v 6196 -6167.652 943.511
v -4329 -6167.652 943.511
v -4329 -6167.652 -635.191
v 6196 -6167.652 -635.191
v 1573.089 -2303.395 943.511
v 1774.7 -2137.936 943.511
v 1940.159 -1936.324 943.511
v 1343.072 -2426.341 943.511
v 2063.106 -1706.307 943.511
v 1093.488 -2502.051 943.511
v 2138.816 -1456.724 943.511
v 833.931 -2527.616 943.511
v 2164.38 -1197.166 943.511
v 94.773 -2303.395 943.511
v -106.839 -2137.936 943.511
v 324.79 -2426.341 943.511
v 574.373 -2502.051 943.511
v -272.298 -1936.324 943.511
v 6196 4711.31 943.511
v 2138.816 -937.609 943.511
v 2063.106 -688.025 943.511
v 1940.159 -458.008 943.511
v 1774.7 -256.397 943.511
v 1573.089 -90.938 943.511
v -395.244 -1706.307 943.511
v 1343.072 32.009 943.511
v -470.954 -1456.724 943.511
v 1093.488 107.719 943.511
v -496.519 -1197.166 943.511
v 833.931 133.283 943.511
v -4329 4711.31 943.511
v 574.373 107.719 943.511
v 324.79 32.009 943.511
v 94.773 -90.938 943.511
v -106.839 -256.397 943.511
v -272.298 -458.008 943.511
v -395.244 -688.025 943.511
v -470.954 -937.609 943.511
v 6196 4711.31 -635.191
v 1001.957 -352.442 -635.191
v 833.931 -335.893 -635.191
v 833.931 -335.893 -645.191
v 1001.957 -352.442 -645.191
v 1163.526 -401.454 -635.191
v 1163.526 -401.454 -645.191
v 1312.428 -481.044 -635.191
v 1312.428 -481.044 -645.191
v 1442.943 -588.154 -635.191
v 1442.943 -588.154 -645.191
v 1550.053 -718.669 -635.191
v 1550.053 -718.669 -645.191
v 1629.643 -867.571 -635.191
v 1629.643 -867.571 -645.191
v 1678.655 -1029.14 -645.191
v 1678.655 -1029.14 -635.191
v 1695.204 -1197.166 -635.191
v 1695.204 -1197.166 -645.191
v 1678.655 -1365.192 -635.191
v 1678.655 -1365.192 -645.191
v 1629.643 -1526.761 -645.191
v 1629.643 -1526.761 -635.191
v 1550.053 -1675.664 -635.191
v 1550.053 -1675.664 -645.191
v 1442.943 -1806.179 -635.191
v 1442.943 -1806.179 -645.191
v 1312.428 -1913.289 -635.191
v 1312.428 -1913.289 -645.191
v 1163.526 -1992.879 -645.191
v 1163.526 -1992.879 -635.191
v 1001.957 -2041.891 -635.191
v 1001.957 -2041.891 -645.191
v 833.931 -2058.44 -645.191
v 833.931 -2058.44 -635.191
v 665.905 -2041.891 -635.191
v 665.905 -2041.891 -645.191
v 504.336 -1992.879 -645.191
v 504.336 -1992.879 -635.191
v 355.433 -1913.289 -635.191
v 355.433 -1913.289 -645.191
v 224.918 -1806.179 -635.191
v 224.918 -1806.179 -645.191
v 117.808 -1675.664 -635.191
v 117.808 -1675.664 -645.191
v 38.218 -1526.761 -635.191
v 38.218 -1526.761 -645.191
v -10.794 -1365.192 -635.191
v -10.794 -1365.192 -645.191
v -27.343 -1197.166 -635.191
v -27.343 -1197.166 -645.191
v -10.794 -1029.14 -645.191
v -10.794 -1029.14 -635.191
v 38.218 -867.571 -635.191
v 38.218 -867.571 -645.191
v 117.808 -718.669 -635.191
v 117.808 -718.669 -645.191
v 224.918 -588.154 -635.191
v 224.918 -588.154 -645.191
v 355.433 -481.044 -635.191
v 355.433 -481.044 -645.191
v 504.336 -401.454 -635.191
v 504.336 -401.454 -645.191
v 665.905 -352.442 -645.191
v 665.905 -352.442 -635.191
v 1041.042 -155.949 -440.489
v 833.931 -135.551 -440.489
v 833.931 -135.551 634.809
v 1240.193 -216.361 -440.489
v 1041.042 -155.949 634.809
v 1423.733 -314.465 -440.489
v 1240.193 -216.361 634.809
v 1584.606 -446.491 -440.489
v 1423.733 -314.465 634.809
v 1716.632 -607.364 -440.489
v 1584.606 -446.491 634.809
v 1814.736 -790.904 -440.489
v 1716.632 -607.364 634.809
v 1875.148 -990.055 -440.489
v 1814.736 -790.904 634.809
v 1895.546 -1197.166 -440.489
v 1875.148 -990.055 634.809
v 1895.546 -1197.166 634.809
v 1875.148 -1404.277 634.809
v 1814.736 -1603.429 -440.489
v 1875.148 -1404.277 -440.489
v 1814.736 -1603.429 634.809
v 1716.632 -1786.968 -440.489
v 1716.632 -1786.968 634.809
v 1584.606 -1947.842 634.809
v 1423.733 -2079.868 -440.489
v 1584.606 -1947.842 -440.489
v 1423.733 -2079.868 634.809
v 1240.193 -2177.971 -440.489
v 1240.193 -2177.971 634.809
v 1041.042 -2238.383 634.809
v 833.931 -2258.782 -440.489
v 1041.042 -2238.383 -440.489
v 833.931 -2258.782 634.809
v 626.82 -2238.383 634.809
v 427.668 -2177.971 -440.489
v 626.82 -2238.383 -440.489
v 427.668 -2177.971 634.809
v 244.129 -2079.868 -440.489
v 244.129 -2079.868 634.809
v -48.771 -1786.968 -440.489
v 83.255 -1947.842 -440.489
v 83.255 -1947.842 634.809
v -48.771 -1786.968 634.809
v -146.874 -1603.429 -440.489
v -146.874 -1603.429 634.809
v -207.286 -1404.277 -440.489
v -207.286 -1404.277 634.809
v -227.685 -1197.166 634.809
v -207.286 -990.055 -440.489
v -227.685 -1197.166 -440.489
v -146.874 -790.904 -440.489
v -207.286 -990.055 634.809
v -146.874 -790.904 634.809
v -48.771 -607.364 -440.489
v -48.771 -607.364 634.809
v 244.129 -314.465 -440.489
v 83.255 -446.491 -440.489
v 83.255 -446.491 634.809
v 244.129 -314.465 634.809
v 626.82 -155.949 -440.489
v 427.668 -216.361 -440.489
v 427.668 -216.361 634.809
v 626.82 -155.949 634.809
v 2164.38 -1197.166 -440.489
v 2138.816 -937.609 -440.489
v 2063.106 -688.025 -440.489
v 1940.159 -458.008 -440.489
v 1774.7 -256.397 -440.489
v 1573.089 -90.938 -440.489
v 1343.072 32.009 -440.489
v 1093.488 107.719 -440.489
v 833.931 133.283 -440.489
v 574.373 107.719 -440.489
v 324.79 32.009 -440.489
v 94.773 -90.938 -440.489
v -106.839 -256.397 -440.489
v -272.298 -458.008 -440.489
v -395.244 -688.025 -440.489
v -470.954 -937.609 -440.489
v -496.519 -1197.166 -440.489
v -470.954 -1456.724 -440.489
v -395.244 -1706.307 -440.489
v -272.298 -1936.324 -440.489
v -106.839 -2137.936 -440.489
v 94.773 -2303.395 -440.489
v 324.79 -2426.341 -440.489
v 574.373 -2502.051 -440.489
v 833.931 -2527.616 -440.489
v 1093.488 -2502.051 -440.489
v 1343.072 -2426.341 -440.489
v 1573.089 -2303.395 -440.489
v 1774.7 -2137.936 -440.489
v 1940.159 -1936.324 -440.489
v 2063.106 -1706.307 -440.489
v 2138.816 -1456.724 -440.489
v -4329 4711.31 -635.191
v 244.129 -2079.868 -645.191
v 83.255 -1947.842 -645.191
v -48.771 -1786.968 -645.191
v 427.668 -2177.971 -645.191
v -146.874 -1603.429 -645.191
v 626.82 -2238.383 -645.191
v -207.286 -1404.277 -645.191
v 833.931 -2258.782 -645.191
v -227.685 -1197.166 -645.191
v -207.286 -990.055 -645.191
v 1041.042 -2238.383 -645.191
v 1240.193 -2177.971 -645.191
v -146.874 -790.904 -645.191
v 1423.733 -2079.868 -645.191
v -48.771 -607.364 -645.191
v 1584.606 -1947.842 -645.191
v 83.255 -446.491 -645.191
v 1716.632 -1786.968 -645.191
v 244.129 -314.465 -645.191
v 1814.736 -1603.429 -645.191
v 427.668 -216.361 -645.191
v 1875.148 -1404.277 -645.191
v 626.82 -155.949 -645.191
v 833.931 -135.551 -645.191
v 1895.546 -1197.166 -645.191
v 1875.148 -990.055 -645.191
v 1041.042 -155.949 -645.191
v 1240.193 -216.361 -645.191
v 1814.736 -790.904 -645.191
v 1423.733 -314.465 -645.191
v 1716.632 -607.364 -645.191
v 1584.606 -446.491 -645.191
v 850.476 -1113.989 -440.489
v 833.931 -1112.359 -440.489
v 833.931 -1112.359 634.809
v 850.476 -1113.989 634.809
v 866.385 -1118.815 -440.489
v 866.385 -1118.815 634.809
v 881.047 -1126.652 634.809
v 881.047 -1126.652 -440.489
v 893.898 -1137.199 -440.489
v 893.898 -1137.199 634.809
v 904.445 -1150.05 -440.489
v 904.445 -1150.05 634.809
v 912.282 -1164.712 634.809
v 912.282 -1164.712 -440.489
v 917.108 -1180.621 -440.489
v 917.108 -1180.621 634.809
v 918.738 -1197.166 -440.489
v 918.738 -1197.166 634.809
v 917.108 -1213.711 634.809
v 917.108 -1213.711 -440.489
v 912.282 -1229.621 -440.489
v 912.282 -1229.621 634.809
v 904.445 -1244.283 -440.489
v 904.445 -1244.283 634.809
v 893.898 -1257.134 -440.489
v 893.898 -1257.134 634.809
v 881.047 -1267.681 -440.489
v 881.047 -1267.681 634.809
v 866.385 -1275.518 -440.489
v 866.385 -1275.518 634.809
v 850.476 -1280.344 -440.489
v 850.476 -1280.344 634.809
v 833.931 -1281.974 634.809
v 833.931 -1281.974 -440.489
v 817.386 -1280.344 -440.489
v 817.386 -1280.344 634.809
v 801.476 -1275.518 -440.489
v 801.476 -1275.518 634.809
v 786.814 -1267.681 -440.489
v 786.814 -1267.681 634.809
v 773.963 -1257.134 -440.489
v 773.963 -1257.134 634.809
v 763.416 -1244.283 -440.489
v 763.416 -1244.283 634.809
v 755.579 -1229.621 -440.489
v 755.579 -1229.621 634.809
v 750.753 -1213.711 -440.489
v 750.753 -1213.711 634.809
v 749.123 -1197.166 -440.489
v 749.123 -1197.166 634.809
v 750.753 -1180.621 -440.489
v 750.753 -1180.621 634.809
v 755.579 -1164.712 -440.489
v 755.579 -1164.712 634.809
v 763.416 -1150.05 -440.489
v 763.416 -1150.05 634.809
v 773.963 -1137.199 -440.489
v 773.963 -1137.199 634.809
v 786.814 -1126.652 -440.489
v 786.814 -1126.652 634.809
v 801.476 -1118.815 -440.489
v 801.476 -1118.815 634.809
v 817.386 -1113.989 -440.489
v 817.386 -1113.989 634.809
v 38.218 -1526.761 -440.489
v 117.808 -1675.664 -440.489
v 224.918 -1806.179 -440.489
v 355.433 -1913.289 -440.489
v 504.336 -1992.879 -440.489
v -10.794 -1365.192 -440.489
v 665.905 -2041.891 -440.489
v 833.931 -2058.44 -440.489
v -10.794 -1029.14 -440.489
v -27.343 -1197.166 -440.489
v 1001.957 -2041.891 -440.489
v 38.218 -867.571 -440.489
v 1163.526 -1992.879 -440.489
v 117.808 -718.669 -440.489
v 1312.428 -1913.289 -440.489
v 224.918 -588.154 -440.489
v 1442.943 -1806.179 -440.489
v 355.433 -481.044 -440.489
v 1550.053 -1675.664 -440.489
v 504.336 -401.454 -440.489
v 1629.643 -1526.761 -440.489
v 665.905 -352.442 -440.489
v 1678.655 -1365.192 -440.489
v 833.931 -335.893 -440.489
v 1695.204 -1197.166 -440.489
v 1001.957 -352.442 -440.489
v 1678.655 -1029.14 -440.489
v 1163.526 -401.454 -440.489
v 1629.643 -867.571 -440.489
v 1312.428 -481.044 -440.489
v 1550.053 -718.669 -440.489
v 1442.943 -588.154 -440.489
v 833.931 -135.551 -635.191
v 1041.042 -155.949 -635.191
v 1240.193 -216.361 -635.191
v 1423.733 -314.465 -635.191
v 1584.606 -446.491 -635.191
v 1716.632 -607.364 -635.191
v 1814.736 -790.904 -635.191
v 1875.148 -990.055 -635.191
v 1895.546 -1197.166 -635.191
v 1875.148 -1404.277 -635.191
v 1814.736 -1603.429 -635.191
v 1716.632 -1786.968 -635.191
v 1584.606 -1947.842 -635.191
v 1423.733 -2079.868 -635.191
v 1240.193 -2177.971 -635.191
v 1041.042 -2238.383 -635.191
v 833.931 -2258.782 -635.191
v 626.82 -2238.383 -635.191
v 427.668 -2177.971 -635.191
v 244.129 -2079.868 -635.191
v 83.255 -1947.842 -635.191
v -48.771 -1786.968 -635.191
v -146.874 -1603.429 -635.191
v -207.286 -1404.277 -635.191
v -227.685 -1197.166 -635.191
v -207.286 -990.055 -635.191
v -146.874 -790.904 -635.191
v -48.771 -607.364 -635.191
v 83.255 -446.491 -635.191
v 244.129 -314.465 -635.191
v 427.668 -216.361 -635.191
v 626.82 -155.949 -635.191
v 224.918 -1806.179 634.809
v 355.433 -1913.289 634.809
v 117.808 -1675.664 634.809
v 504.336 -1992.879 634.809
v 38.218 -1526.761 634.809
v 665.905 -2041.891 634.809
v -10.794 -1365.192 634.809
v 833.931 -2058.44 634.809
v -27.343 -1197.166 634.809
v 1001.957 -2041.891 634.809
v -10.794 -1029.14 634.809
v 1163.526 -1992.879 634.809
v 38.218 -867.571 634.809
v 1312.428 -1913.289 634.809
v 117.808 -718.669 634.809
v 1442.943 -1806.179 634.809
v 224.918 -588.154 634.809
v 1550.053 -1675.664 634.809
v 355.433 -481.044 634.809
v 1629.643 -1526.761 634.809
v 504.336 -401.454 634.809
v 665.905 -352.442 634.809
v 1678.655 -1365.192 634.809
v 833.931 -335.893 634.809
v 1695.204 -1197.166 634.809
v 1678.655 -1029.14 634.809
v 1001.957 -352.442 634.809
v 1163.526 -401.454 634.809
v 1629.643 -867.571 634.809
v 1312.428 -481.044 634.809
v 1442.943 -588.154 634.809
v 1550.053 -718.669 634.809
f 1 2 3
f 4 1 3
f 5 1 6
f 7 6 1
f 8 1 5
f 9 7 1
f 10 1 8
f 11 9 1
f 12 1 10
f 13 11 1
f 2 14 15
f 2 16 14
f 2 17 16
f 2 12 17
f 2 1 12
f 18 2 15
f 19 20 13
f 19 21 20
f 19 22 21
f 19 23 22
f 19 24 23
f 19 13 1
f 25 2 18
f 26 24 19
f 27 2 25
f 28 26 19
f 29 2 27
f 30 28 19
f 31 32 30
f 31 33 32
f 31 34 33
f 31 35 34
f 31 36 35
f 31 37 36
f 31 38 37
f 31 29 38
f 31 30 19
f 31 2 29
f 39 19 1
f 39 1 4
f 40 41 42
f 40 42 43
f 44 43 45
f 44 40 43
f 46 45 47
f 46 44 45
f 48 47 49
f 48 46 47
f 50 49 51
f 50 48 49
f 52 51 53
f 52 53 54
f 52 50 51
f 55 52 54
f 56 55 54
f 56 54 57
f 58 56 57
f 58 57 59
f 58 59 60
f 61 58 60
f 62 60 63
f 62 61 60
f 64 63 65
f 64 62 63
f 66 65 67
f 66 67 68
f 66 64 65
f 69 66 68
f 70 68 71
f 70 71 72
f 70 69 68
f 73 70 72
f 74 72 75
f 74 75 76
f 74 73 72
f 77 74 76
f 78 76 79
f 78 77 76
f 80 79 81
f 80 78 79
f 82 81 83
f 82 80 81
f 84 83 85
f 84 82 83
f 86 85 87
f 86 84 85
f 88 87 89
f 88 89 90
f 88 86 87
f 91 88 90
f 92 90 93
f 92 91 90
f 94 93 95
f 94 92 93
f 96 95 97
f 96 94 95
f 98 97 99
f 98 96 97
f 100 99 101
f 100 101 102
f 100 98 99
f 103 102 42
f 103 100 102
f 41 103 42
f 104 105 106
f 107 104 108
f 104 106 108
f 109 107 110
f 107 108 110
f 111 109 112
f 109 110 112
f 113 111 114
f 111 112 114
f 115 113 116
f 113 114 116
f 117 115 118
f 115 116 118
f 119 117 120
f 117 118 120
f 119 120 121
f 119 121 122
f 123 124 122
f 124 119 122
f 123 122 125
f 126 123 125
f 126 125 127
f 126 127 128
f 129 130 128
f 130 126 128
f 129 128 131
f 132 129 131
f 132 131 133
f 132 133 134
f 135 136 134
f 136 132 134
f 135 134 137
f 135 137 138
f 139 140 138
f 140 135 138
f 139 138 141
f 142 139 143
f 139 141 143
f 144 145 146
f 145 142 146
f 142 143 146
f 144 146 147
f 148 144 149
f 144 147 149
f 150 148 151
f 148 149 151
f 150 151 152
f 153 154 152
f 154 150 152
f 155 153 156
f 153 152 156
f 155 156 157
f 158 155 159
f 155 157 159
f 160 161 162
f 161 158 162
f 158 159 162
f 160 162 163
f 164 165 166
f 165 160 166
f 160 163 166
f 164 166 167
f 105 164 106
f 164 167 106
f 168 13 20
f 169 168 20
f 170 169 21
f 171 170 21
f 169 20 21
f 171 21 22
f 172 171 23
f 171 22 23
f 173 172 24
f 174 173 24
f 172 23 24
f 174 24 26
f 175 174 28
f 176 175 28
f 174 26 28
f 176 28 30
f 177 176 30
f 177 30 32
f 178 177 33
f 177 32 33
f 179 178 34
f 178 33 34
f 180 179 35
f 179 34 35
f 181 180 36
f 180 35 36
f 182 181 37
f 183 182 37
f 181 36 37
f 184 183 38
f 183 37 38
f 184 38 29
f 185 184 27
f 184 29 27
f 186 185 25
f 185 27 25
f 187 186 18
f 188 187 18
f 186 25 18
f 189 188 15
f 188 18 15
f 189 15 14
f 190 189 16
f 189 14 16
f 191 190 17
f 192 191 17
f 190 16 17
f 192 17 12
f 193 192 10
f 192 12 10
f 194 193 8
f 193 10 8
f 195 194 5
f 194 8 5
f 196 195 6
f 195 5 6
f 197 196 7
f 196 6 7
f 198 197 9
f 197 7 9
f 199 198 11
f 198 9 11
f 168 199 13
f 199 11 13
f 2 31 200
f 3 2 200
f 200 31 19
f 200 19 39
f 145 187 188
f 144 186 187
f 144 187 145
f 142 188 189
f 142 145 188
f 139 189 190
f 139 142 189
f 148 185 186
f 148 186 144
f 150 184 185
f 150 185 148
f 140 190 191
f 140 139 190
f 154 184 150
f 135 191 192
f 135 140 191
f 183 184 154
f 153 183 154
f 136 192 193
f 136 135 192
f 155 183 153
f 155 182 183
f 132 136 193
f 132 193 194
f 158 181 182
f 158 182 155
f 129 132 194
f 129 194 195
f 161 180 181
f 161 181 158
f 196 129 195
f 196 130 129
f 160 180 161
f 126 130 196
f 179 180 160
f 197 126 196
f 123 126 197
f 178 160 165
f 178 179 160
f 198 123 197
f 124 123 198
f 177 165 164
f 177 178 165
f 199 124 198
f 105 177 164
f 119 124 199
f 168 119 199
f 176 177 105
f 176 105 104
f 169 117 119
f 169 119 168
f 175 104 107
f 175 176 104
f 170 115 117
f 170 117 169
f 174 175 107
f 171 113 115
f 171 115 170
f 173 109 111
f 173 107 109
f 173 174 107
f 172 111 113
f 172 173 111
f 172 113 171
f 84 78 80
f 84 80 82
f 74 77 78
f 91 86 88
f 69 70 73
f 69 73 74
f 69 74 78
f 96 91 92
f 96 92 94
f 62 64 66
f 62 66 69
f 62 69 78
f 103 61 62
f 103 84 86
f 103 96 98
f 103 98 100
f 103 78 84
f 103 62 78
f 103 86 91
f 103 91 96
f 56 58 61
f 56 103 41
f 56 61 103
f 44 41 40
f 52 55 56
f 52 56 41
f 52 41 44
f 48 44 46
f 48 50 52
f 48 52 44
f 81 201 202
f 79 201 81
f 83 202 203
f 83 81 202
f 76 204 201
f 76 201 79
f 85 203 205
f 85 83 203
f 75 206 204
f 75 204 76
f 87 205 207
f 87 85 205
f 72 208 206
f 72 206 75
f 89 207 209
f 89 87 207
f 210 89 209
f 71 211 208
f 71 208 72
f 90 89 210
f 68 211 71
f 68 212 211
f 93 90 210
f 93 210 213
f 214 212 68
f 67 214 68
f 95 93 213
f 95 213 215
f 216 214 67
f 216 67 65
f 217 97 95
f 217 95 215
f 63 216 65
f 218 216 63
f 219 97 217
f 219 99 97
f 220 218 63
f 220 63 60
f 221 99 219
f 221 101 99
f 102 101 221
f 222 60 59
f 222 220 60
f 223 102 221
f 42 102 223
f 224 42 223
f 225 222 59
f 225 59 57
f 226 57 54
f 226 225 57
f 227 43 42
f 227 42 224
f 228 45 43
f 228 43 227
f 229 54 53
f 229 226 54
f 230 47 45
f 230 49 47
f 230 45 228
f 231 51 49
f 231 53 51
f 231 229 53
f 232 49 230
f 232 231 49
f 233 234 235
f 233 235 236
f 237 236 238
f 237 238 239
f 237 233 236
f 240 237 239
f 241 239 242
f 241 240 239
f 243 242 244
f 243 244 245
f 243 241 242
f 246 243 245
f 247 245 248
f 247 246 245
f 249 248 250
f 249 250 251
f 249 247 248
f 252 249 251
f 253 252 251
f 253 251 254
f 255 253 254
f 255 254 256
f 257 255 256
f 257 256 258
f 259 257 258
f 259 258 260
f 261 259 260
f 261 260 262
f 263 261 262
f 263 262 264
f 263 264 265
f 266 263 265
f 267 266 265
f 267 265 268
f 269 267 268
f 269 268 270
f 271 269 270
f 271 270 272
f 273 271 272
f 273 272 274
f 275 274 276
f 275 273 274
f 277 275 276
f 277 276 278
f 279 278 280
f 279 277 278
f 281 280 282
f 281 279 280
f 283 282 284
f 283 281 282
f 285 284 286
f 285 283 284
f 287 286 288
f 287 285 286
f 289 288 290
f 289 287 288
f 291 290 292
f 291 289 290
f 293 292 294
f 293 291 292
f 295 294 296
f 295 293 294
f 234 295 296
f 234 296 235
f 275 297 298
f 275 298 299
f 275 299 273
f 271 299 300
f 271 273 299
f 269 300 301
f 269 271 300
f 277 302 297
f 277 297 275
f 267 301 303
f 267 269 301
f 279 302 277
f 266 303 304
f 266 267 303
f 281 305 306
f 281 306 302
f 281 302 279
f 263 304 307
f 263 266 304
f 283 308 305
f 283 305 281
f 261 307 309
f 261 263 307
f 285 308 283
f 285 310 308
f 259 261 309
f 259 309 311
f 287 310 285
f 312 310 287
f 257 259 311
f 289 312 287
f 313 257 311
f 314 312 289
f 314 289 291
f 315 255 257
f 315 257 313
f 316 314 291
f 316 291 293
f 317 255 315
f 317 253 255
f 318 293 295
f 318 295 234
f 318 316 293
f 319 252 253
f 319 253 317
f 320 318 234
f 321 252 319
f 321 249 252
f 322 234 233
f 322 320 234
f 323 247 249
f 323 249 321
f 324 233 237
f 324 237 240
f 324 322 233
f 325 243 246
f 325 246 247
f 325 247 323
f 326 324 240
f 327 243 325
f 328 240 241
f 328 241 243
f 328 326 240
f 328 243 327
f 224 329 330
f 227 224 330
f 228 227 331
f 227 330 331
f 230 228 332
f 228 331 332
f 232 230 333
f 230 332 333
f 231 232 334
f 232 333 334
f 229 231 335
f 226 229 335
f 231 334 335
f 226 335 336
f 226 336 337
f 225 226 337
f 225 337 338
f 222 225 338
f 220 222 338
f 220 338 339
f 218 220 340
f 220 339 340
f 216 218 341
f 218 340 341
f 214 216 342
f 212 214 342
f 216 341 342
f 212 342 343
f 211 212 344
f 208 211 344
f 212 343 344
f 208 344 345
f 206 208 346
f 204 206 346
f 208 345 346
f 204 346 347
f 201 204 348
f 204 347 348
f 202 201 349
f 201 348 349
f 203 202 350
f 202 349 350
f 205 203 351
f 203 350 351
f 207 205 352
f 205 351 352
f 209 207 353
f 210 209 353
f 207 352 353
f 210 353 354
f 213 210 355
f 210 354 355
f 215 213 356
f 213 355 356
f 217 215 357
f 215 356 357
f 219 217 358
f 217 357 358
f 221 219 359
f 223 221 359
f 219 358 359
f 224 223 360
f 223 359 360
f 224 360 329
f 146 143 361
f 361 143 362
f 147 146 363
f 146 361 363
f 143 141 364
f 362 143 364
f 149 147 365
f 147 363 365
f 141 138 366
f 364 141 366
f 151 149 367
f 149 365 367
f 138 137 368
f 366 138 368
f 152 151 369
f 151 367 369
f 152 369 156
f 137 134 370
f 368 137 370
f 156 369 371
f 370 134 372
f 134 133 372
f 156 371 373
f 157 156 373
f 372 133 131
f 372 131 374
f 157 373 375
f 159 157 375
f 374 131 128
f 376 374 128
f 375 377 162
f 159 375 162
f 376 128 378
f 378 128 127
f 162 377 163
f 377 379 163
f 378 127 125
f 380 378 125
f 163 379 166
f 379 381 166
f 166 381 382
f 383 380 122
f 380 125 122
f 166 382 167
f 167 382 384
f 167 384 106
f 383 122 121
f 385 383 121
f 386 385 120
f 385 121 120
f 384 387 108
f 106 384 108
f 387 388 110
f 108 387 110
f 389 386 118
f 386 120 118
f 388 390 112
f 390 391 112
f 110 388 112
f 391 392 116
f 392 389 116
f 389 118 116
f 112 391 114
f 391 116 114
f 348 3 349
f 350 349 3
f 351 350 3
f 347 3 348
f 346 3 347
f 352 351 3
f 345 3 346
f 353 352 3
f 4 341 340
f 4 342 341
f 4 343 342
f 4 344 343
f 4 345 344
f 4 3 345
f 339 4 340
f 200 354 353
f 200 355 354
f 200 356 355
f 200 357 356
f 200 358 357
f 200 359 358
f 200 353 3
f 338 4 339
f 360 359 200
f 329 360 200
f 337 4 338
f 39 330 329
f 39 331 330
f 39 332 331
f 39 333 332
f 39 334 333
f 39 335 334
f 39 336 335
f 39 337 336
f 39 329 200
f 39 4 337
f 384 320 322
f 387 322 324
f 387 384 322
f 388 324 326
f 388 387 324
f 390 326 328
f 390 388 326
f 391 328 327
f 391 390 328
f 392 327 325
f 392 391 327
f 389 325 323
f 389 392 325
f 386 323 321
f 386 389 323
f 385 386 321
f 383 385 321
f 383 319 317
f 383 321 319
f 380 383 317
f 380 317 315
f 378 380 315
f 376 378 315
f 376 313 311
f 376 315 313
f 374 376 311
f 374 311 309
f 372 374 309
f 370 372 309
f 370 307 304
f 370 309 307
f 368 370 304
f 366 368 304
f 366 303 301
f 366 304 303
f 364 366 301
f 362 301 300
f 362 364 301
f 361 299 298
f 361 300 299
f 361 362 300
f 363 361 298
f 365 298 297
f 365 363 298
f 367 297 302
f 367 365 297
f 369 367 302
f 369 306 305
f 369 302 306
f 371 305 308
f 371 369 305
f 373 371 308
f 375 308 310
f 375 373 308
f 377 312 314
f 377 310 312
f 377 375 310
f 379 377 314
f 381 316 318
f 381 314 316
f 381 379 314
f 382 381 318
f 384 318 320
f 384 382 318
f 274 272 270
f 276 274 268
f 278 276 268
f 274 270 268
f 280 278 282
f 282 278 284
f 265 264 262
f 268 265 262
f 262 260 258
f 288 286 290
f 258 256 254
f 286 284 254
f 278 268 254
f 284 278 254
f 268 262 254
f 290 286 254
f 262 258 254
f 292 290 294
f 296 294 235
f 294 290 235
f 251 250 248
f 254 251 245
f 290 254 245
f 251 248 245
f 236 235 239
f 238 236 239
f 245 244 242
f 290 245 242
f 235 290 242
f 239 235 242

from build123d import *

# Parameters (mm, degrees)
BOSS_EXTRUDE1_DEPTH      = 6196
BOSS_EXTRUDE1_DEPTH_BACK = 4329
SKETCH1_W                = 1578.701976668
SKETCH1_H                = 10878.961606317
SKETCH3_R                = 1330.449328347
CUT_EXTRUDE1_DEPTH       = 1384
SKETCH4_R                = 84.807211279
BOSS_EXTRUDE2_DEPTH      = 1270
SKETCH5_R                = 1061.615772672
SKETCH5_R_2              = 861.273399979
BOSS_EXTRUDE3_DEPTH      = 10
BOSS_EXTRUDE4_START      = -1270
SKETCH5_2_R              = 1061.615772672
SKETCH5_2_R_2            = 861.273399979
BOSS_EXTRUDE4_DEPTH      = 1270


with BuildPart() as part:
    # Sketch1 → Boss-Extrude1 (new, two sides: drawn at the far end of the back side and taken through both)
    with BuildSketch(Plane(origin=(0, 0, 0), x_dir=(0, 0, -1), z_dir=(1, 0, 0)).offset(-BOSS_EXTRUDE1_DEPTH_BACK)):
        with Locations((-154.159787834, -728.170853353)):
            Rectangle(SKETCH1_W, SKETCH1_H)
    extrude(amount=BOSS_EXTRUDE1_DEPTH + BOSS_EXTRUDE1_DEPTH_BACK)

    # Sketch3 → Cut-Extrude1 (cut)
    with BuildSketch(Plane.XY.offset(943.510776168)):
        with Locations((833.930631376, -1197.16637306)):
            Circle(SKETCH3_R)
    extrude(amount=-CUT_EXTRUDE1_DEPTH, mode=Mode.SUBTRACT)

    # Sketch4 → Boss-Extrude2 (add)
    with BuildSketch(Plane(origin=(0, 0, -635.1912005), x_dir=(-1, 0, 0), z_dir=(0, 0, -1))):
        with Locations((-833.930631376, -1197.16637306)):
            Circle(SKETCH4_R)
    extrude(amount=-BOSS_EXTRUDE2_DEPTH)

    # Sketch5 → Boss-Extrude3 (add)
    with BuildSketch(Plane(origin=(0, 0, -635.1912005), x_dir=(-1, 0, 0), z_dir=(0, 0, -1))):
        with Locations((-833.930631376, -1197.16637306)):
            Circle(SKETCH5_R)
        with Locations((-833.930631376, -1197.16637306)):
            Circle(SKETCH5_R_2, mode=Mode.SUBTRACT)
    extrude(amount=BOSS_EXTRUDE3_DEPTH)

    # Sketch5<2> → Boss-Extrude4 (add)
    with BuildSketch(Plane(origin=(0, 0, -635.1912005), x_dir=(-1, 0, 0), z_dir=(0, 0, -1)).offset(BOSS_EXTRUDE4_START)):
        with Locations((-833.930631376, -1197.16637306)):
            Circle(SKETCH5_2_R)
        with Locations((-833.930631376, -1197.16637306)):
            Circle(SKETCH5_2_R_2, mode=Mode.SUBTRACT)
    extrude(amount=BOSS_EXTRUDE4_DEPTH)


solid = part.part
